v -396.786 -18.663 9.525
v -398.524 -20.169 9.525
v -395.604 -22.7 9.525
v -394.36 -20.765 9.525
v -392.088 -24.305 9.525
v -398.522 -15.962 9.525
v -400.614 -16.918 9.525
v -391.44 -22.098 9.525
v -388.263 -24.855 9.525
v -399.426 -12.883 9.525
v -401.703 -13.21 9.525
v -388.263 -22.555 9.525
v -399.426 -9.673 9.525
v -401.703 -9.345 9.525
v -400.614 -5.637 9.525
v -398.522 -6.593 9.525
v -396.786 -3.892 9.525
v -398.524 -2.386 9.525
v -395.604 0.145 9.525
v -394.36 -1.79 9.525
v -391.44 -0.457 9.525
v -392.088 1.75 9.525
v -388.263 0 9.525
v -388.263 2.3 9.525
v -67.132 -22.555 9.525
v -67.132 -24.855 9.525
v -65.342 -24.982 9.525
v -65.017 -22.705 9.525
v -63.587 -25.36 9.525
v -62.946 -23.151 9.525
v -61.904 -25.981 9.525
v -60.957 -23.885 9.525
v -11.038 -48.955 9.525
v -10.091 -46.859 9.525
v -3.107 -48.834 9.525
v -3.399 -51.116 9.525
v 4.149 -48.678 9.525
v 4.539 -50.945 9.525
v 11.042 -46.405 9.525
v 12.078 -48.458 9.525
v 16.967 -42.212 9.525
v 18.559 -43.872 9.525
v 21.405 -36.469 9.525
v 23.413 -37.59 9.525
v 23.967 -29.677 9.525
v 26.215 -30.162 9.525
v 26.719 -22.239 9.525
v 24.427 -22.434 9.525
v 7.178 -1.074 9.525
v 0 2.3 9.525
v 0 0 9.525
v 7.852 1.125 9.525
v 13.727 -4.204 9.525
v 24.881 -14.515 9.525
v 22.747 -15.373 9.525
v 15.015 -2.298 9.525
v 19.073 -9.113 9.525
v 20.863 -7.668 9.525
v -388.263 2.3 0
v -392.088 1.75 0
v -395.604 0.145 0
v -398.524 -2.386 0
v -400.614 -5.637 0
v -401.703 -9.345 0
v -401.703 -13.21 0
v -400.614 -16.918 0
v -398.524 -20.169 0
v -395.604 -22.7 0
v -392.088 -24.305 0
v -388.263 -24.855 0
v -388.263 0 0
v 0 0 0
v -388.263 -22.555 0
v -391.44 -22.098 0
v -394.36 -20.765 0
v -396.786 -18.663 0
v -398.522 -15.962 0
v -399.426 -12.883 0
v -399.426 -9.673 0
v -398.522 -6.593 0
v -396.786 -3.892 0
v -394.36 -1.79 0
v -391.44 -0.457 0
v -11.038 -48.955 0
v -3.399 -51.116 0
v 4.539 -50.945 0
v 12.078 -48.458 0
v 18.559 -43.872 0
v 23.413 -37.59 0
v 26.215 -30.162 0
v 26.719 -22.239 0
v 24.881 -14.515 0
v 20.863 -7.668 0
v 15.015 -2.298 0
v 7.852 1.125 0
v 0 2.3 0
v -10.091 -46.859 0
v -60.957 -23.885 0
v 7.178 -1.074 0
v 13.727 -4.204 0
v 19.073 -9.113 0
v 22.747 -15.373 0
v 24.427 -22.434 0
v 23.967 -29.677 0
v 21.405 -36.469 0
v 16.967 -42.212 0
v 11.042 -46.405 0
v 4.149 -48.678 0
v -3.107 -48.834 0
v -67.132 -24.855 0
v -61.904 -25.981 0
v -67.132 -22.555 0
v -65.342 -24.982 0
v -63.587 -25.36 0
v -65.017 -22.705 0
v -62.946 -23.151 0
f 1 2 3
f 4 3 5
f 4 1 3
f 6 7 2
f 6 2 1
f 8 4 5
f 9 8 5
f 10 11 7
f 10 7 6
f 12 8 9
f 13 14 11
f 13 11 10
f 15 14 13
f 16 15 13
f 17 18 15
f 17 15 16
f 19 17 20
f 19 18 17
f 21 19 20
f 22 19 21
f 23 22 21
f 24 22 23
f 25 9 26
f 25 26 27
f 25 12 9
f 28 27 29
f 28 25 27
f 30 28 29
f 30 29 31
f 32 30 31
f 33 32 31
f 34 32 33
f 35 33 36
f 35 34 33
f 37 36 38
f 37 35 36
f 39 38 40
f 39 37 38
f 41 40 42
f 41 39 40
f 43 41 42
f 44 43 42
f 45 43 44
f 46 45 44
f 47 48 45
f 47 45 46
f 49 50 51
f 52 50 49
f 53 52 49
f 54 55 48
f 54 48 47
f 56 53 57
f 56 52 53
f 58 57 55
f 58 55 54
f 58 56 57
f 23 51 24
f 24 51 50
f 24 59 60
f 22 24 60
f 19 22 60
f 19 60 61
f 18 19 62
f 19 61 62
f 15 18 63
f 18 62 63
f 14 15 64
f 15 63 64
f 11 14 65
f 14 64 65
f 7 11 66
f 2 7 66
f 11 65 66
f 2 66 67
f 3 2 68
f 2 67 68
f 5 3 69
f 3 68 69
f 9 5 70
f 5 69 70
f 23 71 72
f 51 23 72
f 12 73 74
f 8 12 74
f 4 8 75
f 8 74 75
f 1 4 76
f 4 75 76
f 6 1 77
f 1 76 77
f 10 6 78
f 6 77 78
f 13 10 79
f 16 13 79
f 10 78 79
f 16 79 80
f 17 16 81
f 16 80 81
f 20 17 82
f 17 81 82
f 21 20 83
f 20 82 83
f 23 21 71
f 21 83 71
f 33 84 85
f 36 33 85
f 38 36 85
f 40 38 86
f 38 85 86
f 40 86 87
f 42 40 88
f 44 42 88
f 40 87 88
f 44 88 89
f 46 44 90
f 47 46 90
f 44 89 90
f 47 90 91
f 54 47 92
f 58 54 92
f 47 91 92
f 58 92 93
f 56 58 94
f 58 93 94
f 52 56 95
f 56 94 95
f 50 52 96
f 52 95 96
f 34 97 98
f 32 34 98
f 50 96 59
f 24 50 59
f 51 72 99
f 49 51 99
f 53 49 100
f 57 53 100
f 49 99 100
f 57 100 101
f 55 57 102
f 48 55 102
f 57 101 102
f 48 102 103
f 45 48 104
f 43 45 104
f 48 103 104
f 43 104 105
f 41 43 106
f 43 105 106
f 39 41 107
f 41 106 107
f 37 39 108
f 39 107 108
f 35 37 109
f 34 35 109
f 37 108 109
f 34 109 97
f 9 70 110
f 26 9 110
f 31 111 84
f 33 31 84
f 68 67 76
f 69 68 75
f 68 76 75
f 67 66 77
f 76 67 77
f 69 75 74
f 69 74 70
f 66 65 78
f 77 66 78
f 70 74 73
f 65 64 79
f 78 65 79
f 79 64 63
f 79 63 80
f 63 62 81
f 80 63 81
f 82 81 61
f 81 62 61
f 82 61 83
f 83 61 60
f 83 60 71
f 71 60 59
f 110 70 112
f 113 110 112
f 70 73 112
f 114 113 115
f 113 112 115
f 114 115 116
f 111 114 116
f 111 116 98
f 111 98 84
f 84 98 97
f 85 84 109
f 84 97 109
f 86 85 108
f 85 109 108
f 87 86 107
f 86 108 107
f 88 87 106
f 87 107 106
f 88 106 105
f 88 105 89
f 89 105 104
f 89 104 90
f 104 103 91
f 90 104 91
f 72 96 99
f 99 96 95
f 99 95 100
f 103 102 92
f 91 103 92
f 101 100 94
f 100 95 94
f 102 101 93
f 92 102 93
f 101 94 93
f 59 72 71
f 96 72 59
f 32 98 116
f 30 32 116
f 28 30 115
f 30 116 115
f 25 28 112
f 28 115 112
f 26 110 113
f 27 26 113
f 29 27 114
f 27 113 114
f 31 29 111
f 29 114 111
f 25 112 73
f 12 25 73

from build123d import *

# Parameters (mm, degrees)
F1_DEPTH = 9.525


with BuildPart() as f1:
    # F0 (on Top) → F1 (new body)
    with BuildSketch(Plane.XY):
        with BuildLine():
            Line((0, 2.3), (-388.263155, 2.3))
            ThreePointArc((-388.263155, 2.3), (-401.840755, -11.2776), (-388.263155, -24.8552))
            Line((-388.263155, -24.8552), (-67.131578, -24.8552))
            ThreePointArc((-67.131578, -24.8552), (-64.457855, -25.139838), (-61.903982, -25.980994))
            Line((-61.903982, -25.980994), (-11.038081, -48.955043))
            ThreePointArc((-11.038081, -48.955043), (26.215066, -30.161652), (0, 2.3))
        make_face()
        with BuildLine():
            ThreePointArc((0, 0), (23.966614, -29.677434), (-10.091351, -46.858927))
            Line((-10.091351, -46.858927), (-60.957252, -23.884878))
            ThreePointArc((-60.957252, -23.884878), (-63.973638, -22.891387), (-67.131578, -22.5552))
            Line((-67.131578, -22.5552), (-388.263155, -22.5552))
            ThreePointArc((-388.263155, -22.5552), (-399.540755, -11.2776), (-388.263155, 0))
            Line((-388.263155, 0), (0, 0))
        make_face(mode=Mode.SUBTRACT)
    extrude(amount=F1_DEPTH)


solid = f1.part
